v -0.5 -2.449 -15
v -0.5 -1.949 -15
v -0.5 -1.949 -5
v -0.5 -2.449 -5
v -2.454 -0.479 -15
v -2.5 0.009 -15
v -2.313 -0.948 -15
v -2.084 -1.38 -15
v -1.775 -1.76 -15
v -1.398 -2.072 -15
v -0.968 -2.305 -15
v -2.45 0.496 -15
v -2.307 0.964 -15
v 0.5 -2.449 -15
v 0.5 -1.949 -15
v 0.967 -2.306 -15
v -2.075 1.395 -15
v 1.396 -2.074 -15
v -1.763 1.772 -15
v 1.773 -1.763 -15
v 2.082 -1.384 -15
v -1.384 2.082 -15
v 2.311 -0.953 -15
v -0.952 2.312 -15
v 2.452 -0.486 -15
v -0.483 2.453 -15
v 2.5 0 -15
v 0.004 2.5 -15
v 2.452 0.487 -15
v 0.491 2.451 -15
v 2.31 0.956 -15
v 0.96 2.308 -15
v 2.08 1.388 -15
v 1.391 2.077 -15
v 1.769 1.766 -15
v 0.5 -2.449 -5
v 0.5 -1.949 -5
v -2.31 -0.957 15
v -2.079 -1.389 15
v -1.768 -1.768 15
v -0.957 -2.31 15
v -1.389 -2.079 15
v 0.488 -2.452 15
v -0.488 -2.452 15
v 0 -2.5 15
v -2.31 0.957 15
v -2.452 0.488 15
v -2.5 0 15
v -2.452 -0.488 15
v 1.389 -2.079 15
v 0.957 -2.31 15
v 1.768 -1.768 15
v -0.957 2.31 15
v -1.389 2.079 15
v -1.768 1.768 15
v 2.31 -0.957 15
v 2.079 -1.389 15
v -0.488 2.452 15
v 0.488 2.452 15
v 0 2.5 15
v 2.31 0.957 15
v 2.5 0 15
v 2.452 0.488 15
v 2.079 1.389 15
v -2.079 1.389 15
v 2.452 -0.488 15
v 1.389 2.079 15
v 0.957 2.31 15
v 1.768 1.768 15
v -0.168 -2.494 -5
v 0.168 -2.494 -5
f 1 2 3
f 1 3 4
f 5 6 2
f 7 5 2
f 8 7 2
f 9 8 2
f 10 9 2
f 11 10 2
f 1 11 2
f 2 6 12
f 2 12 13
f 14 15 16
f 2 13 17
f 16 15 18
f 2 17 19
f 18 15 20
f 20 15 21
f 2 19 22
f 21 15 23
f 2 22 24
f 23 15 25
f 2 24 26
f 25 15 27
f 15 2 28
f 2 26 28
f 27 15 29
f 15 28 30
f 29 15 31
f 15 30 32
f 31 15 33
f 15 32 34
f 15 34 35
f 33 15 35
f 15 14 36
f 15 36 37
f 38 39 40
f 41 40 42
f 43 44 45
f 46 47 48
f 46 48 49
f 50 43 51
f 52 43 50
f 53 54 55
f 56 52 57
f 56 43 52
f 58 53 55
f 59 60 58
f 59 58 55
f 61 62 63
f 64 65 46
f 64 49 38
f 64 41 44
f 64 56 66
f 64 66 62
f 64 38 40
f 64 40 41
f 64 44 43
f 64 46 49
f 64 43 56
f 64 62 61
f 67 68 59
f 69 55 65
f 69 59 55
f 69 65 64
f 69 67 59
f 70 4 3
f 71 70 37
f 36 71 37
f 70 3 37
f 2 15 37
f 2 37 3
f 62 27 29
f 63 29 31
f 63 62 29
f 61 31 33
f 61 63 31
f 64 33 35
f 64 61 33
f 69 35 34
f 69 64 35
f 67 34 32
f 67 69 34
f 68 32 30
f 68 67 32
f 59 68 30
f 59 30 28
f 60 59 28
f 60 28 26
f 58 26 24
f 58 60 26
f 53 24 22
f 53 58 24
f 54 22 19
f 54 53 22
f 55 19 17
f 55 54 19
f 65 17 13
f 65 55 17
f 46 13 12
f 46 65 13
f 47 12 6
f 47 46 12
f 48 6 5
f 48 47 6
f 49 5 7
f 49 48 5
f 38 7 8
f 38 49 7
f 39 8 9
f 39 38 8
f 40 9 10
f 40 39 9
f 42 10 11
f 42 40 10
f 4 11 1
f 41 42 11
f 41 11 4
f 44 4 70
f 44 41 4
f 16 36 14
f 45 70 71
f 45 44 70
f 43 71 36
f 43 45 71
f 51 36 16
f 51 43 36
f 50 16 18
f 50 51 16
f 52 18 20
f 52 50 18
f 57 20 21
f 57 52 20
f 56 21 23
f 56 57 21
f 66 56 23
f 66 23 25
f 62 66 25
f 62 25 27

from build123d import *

# Parameters (mm, degrees)
SKETCH1_R           = 2.5
BOSS_EXTRUDE1_DEPTH = 15
CUT_EXTRUDE1_DEPTH  = 10


with BuildPart() as part:
    # Sketch1 → Boss-Extrude1 (new body, symmetric)
    with BuildSketch(Plane.XY):
        Circle(SKETCH1_R)
    extrude(amount=BOSS_EXTRUDE1_DEPTH, both=True)

    # Sketch2 → Cut-Extrude1 (cut)
    with BuildSketch(Plane(origin=(0, 0, -15), x_dir=(-1, 0, 0), z_dir=(0, 0, -1))):
        with BuildLine():
            Line((-0.5, -2.449489743), (-0.5, -1.949489743))
            Line((-0.5, -1.949489743), (0.5, -1.949489743))
            Line((0.5, -1.949489743), (0.5, -2.449489743))
            ThreePointArc((0.5, -2.449489743), (0, -2.5), (-0.5, -2.449489743))
        make_face()
    extrude(amount=-CUT_EXTRUDE1_DEPTH, mode=Mode.SUBTRACT)


solid = part.part
